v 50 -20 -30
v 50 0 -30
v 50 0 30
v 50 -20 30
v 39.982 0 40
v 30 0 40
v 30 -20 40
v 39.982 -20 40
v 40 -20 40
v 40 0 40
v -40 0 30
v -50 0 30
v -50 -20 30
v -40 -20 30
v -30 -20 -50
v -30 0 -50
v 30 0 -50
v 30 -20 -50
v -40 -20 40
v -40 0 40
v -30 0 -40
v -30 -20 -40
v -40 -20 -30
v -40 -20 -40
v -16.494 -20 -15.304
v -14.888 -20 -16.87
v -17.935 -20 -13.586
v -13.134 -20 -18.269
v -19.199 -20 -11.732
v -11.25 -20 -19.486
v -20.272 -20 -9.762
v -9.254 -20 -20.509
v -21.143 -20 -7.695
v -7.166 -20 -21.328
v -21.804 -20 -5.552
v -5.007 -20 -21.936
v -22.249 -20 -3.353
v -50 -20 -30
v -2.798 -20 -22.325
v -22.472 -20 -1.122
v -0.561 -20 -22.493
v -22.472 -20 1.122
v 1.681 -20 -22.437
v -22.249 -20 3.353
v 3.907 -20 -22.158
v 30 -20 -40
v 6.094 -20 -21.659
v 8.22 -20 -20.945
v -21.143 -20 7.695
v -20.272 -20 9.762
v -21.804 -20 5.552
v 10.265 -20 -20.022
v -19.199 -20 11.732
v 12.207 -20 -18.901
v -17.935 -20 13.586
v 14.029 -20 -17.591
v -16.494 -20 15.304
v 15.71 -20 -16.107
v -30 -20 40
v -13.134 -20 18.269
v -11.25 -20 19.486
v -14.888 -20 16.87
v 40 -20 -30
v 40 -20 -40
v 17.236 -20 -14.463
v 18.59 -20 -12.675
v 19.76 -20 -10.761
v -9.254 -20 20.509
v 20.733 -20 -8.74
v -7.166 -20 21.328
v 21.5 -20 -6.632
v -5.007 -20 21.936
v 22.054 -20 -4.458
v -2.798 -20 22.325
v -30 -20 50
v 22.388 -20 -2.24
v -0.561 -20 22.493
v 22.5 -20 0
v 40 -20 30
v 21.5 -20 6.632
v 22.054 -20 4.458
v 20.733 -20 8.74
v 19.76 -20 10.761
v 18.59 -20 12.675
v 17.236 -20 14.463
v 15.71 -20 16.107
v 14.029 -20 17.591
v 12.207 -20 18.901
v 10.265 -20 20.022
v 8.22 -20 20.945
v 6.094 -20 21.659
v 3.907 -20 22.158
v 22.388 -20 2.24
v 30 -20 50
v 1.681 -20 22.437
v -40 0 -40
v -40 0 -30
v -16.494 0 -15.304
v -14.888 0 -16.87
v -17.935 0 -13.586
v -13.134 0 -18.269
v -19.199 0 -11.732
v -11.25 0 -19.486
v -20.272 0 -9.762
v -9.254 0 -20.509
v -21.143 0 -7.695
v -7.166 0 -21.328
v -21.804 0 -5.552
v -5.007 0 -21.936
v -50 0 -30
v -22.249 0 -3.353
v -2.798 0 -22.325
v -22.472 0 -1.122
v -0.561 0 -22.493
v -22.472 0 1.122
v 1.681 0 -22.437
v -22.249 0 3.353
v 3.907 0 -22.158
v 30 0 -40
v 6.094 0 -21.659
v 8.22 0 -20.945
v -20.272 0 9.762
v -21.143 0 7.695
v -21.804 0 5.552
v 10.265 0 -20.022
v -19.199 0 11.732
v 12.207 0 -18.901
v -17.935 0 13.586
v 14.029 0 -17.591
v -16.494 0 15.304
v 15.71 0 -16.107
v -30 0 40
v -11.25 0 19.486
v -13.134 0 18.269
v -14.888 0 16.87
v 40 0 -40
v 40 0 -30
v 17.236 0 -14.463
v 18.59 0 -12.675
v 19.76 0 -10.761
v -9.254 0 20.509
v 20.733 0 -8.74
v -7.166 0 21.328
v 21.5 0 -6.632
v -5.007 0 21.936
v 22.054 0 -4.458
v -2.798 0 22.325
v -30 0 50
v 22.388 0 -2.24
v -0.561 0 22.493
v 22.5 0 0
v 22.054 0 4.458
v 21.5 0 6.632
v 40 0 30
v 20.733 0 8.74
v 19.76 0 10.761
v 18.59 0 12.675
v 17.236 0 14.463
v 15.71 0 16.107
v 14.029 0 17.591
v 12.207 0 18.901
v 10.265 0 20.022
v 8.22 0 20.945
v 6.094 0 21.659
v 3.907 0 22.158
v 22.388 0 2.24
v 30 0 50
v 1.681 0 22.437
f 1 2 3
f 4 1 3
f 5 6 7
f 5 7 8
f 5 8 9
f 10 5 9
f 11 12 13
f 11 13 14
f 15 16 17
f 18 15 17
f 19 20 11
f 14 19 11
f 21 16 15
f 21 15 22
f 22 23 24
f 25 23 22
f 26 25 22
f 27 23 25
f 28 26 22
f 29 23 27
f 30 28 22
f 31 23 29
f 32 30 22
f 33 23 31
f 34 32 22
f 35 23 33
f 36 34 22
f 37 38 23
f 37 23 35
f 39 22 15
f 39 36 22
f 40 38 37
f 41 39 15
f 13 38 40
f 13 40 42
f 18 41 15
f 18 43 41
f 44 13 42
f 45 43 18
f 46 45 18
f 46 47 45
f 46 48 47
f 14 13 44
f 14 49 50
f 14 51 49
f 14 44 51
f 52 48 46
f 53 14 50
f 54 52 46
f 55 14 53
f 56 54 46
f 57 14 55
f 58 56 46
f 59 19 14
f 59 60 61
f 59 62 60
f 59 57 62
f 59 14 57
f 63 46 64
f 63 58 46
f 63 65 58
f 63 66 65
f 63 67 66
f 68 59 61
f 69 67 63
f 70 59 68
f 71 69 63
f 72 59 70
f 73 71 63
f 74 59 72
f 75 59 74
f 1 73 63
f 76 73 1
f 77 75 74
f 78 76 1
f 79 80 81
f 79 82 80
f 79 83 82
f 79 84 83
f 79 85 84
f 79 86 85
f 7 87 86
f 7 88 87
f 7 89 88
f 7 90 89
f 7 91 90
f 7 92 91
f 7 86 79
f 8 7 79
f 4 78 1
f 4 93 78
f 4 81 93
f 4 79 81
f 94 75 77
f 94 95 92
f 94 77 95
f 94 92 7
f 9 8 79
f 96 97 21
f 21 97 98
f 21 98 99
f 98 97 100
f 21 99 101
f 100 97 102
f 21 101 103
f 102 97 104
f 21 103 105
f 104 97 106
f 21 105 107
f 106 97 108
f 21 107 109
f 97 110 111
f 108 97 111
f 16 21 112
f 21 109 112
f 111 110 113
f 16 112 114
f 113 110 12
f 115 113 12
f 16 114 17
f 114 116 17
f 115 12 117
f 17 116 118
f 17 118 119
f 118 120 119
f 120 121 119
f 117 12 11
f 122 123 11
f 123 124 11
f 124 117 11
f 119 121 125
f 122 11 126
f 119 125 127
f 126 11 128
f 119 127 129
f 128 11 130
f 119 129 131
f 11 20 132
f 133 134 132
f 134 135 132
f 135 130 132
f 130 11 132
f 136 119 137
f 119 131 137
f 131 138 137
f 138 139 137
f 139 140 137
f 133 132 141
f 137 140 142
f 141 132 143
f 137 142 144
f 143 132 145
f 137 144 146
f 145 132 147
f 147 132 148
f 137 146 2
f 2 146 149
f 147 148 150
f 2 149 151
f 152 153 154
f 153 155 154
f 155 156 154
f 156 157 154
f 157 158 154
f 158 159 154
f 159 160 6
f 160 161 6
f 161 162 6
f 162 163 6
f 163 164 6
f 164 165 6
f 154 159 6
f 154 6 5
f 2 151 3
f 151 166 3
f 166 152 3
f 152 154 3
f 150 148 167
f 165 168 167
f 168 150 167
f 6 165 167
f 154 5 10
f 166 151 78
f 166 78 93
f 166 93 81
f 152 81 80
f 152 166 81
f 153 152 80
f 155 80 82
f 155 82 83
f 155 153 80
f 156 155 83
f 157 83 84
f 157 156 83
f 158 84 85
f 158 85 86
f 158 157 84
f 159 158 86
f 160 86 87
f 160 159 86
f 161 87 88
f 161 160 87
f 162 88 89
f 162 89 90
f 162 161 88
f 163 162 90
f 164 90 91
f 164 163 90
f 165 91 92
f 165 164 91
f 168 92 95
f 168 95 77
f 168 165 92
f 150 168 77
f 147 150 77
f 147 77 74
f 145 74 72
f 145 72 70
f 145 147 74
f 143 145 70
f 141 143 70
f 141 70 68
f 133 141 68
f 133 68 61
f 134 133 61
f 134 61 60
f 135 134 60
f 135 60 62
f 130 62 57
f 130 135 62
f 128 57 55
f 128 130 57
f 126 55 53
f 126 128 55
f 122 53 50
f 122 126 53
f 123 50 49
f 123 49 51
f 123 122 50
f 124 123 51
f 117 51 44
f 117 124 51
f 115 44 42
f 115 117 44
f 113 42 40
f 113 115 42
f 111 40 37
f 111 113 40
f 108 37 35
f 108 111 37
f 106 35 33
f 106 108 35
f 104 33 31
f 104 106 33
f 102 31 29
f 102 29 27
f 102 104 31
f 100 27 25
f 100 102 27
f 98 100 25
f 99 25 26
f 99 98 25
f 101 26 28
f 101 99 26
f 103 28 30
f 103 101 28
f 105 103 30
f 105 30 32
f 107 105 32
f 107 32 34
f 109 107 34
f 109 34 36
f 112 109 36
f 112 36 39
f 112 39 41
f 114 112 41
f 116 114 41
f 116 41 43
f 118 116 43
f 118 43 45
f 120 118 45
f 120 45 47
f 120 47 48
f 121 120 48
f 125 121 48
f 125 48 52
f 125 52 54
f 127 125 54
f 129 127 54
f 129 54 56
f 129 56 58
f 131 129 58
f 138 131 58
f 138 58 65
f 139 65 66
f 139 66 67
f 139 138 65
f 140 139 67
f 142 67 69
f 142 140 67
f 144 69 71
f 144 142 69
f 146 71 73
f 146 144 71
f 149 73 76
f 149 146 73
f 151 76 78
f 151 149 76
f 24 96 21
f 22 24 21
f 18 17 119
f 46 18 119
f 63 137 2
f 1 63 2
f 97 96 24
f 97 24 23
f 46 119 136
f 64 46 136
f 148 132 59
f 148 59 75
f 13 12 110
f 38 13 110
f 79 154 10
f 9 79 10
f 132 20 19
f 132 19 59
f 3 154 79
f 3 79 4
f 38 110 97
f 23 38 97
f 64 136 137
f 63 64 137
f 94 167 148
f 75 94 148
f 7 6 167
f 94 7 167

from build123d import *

# Parameters (mm, degrees)
F0_W     = 10
F0_H     = 10
F0_R     = 22.5
F0_W_2   = 0.0176012516
F0_H_2   = 0.0236101449
F0_W_3   = 0.002938509
F0_H_3   = 0.0060267746
F1_DEPTH = 20


with BuildPart() as f1:
    # F0 (on Front) → F1 (new body)
    with BuildSketch(Plane.XZ):
        with Locations((-25, 45)):
            Rectangle(F0_W, F0_H)
        with Locations((-35, 35)):
            Rectangle(F0_W, F0_H)
        Polygon((20, 50), (-20, 50), (-20, 40), (-30, 40), (-30, 30), (-40, 30), (-40, 20), (-50, 20), (-50, -20), (-40, -20), (-40, -30), (-30, -30), (-30, -40), (-20, -40), (-20, -50), (20, -50), (20, -40), (30, -40), (30, -30), (40, -30), (40, -20), (50, -20), (50, 20), (40, 20), (40, 30), (30, 30), (30, 40), (20, 40), align=None)
        Circle(F0_R, mode=Mode.SUBTRACT)
        with Locations((-45, 25)):
            Rectangle(F0_W, F0_H)
        with Locations((25, 45)):
            Rectangle(F0_W, F0_H)
        Polygon((39.9823987484, 40), (30, 40), (30, 30), (40, 30), (40, 39.9763898551), (39.9823987484, 39.9763898551), align=None)
        with Locations((-45, -25)):
            Rectangle(F0_W, F0_H)
        with Locations((39.9911993742, 39.9881949276)):
            Rectangle(F0_W_2, F0_H_2)
        with Locations((45, 25)):
            Rectangle(F0_W, F0_H)
        with Locations((-35, -35)):
            Rectangle(F0_W, F0_H)
        with Locations((-25, -45)):
            Rectangle(F0_W, F0_H)
        with Locations((45, -25)):
            Rectangle(F0_W, F0_H)
        Polygon((40, -39.9939732254), (40, -30), (30, -30), (30, -40), (39.9823987484, -40), (39.997061491, -40), (39.997061491, -39.9939732254), align=None)
        with Locations((25, -45)):
            Rectangle(F0_W, F0_H)
        with Locations((39.9985307455, -39.9969866127)):
            Rectangle(F0_W_3, F0_H_3)
    extrude(amount=F1_DEPTH)


solid = f1.part
